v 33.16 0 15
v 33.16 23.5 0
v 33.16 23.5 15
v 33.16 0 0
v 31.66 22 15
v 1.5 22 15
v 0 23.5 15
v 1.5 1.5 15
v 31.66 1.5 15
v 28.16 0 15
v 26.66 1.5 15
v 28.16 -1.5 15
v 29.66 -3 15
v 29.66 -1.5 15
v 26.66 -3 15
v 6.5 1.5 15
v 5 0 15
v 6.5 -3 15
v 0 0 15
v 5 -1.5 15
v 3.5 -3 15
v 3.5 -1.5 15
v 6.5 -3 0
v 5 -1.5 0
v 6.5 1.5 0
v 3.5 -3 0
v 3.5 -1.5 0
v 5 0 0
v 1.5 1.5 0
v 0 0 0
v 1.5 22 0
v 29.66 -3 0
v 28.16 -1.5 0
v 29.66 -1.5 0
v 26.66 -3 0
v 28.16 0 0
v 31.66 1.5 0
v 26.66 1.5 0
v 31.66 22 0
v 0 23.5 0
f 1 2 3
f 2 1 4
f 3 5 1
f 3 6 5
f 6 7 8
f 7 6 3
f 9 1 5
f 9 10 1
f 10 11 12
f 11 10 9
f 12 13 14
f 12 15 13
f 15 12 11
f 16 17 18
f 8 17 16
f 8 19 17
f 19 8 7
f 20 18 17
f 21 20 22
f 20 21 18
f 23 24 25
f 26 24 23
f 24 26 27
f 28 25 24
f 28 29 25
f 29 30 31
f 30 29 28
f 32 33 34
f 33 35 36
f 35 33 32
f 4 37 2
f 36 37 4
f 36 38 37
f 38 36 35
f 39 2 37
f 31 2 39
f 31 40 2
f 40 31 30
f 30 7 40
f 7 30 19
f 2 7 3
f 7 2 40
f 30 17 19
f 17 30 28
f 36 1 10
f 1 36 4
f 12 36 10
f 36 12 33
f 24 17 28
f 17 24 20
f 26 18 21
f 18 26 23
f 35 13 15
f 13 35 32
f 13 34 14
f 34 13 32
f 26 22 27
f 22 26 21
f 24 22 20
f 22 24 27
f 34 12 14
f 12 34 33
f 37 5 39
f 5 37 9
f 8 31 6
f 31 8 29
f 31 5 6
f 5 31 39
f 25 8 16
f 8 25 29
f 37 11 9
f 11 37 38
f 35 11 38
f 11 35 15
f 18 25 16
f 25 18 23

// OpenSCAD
h = 15;
w = 30.16;
d = 20.5;
t = 1.5;

o = 5;

difference(){
    union(){
        cube([w + 2*t, d + 2*t, h]);
        translate([o, -2*t, 0])
        cube([w - 2*(o - t), 2*t, h]);
        translate([o - t, -2*t, 0])
        cube([w - 2*(o - 2*t), t, h]);
    }
    translate([t, t, 0])
    cube([w, d, h]);
    translate([t + o, -2*t, 0])
    cube([w - 2*o, t*3, h]);
}
